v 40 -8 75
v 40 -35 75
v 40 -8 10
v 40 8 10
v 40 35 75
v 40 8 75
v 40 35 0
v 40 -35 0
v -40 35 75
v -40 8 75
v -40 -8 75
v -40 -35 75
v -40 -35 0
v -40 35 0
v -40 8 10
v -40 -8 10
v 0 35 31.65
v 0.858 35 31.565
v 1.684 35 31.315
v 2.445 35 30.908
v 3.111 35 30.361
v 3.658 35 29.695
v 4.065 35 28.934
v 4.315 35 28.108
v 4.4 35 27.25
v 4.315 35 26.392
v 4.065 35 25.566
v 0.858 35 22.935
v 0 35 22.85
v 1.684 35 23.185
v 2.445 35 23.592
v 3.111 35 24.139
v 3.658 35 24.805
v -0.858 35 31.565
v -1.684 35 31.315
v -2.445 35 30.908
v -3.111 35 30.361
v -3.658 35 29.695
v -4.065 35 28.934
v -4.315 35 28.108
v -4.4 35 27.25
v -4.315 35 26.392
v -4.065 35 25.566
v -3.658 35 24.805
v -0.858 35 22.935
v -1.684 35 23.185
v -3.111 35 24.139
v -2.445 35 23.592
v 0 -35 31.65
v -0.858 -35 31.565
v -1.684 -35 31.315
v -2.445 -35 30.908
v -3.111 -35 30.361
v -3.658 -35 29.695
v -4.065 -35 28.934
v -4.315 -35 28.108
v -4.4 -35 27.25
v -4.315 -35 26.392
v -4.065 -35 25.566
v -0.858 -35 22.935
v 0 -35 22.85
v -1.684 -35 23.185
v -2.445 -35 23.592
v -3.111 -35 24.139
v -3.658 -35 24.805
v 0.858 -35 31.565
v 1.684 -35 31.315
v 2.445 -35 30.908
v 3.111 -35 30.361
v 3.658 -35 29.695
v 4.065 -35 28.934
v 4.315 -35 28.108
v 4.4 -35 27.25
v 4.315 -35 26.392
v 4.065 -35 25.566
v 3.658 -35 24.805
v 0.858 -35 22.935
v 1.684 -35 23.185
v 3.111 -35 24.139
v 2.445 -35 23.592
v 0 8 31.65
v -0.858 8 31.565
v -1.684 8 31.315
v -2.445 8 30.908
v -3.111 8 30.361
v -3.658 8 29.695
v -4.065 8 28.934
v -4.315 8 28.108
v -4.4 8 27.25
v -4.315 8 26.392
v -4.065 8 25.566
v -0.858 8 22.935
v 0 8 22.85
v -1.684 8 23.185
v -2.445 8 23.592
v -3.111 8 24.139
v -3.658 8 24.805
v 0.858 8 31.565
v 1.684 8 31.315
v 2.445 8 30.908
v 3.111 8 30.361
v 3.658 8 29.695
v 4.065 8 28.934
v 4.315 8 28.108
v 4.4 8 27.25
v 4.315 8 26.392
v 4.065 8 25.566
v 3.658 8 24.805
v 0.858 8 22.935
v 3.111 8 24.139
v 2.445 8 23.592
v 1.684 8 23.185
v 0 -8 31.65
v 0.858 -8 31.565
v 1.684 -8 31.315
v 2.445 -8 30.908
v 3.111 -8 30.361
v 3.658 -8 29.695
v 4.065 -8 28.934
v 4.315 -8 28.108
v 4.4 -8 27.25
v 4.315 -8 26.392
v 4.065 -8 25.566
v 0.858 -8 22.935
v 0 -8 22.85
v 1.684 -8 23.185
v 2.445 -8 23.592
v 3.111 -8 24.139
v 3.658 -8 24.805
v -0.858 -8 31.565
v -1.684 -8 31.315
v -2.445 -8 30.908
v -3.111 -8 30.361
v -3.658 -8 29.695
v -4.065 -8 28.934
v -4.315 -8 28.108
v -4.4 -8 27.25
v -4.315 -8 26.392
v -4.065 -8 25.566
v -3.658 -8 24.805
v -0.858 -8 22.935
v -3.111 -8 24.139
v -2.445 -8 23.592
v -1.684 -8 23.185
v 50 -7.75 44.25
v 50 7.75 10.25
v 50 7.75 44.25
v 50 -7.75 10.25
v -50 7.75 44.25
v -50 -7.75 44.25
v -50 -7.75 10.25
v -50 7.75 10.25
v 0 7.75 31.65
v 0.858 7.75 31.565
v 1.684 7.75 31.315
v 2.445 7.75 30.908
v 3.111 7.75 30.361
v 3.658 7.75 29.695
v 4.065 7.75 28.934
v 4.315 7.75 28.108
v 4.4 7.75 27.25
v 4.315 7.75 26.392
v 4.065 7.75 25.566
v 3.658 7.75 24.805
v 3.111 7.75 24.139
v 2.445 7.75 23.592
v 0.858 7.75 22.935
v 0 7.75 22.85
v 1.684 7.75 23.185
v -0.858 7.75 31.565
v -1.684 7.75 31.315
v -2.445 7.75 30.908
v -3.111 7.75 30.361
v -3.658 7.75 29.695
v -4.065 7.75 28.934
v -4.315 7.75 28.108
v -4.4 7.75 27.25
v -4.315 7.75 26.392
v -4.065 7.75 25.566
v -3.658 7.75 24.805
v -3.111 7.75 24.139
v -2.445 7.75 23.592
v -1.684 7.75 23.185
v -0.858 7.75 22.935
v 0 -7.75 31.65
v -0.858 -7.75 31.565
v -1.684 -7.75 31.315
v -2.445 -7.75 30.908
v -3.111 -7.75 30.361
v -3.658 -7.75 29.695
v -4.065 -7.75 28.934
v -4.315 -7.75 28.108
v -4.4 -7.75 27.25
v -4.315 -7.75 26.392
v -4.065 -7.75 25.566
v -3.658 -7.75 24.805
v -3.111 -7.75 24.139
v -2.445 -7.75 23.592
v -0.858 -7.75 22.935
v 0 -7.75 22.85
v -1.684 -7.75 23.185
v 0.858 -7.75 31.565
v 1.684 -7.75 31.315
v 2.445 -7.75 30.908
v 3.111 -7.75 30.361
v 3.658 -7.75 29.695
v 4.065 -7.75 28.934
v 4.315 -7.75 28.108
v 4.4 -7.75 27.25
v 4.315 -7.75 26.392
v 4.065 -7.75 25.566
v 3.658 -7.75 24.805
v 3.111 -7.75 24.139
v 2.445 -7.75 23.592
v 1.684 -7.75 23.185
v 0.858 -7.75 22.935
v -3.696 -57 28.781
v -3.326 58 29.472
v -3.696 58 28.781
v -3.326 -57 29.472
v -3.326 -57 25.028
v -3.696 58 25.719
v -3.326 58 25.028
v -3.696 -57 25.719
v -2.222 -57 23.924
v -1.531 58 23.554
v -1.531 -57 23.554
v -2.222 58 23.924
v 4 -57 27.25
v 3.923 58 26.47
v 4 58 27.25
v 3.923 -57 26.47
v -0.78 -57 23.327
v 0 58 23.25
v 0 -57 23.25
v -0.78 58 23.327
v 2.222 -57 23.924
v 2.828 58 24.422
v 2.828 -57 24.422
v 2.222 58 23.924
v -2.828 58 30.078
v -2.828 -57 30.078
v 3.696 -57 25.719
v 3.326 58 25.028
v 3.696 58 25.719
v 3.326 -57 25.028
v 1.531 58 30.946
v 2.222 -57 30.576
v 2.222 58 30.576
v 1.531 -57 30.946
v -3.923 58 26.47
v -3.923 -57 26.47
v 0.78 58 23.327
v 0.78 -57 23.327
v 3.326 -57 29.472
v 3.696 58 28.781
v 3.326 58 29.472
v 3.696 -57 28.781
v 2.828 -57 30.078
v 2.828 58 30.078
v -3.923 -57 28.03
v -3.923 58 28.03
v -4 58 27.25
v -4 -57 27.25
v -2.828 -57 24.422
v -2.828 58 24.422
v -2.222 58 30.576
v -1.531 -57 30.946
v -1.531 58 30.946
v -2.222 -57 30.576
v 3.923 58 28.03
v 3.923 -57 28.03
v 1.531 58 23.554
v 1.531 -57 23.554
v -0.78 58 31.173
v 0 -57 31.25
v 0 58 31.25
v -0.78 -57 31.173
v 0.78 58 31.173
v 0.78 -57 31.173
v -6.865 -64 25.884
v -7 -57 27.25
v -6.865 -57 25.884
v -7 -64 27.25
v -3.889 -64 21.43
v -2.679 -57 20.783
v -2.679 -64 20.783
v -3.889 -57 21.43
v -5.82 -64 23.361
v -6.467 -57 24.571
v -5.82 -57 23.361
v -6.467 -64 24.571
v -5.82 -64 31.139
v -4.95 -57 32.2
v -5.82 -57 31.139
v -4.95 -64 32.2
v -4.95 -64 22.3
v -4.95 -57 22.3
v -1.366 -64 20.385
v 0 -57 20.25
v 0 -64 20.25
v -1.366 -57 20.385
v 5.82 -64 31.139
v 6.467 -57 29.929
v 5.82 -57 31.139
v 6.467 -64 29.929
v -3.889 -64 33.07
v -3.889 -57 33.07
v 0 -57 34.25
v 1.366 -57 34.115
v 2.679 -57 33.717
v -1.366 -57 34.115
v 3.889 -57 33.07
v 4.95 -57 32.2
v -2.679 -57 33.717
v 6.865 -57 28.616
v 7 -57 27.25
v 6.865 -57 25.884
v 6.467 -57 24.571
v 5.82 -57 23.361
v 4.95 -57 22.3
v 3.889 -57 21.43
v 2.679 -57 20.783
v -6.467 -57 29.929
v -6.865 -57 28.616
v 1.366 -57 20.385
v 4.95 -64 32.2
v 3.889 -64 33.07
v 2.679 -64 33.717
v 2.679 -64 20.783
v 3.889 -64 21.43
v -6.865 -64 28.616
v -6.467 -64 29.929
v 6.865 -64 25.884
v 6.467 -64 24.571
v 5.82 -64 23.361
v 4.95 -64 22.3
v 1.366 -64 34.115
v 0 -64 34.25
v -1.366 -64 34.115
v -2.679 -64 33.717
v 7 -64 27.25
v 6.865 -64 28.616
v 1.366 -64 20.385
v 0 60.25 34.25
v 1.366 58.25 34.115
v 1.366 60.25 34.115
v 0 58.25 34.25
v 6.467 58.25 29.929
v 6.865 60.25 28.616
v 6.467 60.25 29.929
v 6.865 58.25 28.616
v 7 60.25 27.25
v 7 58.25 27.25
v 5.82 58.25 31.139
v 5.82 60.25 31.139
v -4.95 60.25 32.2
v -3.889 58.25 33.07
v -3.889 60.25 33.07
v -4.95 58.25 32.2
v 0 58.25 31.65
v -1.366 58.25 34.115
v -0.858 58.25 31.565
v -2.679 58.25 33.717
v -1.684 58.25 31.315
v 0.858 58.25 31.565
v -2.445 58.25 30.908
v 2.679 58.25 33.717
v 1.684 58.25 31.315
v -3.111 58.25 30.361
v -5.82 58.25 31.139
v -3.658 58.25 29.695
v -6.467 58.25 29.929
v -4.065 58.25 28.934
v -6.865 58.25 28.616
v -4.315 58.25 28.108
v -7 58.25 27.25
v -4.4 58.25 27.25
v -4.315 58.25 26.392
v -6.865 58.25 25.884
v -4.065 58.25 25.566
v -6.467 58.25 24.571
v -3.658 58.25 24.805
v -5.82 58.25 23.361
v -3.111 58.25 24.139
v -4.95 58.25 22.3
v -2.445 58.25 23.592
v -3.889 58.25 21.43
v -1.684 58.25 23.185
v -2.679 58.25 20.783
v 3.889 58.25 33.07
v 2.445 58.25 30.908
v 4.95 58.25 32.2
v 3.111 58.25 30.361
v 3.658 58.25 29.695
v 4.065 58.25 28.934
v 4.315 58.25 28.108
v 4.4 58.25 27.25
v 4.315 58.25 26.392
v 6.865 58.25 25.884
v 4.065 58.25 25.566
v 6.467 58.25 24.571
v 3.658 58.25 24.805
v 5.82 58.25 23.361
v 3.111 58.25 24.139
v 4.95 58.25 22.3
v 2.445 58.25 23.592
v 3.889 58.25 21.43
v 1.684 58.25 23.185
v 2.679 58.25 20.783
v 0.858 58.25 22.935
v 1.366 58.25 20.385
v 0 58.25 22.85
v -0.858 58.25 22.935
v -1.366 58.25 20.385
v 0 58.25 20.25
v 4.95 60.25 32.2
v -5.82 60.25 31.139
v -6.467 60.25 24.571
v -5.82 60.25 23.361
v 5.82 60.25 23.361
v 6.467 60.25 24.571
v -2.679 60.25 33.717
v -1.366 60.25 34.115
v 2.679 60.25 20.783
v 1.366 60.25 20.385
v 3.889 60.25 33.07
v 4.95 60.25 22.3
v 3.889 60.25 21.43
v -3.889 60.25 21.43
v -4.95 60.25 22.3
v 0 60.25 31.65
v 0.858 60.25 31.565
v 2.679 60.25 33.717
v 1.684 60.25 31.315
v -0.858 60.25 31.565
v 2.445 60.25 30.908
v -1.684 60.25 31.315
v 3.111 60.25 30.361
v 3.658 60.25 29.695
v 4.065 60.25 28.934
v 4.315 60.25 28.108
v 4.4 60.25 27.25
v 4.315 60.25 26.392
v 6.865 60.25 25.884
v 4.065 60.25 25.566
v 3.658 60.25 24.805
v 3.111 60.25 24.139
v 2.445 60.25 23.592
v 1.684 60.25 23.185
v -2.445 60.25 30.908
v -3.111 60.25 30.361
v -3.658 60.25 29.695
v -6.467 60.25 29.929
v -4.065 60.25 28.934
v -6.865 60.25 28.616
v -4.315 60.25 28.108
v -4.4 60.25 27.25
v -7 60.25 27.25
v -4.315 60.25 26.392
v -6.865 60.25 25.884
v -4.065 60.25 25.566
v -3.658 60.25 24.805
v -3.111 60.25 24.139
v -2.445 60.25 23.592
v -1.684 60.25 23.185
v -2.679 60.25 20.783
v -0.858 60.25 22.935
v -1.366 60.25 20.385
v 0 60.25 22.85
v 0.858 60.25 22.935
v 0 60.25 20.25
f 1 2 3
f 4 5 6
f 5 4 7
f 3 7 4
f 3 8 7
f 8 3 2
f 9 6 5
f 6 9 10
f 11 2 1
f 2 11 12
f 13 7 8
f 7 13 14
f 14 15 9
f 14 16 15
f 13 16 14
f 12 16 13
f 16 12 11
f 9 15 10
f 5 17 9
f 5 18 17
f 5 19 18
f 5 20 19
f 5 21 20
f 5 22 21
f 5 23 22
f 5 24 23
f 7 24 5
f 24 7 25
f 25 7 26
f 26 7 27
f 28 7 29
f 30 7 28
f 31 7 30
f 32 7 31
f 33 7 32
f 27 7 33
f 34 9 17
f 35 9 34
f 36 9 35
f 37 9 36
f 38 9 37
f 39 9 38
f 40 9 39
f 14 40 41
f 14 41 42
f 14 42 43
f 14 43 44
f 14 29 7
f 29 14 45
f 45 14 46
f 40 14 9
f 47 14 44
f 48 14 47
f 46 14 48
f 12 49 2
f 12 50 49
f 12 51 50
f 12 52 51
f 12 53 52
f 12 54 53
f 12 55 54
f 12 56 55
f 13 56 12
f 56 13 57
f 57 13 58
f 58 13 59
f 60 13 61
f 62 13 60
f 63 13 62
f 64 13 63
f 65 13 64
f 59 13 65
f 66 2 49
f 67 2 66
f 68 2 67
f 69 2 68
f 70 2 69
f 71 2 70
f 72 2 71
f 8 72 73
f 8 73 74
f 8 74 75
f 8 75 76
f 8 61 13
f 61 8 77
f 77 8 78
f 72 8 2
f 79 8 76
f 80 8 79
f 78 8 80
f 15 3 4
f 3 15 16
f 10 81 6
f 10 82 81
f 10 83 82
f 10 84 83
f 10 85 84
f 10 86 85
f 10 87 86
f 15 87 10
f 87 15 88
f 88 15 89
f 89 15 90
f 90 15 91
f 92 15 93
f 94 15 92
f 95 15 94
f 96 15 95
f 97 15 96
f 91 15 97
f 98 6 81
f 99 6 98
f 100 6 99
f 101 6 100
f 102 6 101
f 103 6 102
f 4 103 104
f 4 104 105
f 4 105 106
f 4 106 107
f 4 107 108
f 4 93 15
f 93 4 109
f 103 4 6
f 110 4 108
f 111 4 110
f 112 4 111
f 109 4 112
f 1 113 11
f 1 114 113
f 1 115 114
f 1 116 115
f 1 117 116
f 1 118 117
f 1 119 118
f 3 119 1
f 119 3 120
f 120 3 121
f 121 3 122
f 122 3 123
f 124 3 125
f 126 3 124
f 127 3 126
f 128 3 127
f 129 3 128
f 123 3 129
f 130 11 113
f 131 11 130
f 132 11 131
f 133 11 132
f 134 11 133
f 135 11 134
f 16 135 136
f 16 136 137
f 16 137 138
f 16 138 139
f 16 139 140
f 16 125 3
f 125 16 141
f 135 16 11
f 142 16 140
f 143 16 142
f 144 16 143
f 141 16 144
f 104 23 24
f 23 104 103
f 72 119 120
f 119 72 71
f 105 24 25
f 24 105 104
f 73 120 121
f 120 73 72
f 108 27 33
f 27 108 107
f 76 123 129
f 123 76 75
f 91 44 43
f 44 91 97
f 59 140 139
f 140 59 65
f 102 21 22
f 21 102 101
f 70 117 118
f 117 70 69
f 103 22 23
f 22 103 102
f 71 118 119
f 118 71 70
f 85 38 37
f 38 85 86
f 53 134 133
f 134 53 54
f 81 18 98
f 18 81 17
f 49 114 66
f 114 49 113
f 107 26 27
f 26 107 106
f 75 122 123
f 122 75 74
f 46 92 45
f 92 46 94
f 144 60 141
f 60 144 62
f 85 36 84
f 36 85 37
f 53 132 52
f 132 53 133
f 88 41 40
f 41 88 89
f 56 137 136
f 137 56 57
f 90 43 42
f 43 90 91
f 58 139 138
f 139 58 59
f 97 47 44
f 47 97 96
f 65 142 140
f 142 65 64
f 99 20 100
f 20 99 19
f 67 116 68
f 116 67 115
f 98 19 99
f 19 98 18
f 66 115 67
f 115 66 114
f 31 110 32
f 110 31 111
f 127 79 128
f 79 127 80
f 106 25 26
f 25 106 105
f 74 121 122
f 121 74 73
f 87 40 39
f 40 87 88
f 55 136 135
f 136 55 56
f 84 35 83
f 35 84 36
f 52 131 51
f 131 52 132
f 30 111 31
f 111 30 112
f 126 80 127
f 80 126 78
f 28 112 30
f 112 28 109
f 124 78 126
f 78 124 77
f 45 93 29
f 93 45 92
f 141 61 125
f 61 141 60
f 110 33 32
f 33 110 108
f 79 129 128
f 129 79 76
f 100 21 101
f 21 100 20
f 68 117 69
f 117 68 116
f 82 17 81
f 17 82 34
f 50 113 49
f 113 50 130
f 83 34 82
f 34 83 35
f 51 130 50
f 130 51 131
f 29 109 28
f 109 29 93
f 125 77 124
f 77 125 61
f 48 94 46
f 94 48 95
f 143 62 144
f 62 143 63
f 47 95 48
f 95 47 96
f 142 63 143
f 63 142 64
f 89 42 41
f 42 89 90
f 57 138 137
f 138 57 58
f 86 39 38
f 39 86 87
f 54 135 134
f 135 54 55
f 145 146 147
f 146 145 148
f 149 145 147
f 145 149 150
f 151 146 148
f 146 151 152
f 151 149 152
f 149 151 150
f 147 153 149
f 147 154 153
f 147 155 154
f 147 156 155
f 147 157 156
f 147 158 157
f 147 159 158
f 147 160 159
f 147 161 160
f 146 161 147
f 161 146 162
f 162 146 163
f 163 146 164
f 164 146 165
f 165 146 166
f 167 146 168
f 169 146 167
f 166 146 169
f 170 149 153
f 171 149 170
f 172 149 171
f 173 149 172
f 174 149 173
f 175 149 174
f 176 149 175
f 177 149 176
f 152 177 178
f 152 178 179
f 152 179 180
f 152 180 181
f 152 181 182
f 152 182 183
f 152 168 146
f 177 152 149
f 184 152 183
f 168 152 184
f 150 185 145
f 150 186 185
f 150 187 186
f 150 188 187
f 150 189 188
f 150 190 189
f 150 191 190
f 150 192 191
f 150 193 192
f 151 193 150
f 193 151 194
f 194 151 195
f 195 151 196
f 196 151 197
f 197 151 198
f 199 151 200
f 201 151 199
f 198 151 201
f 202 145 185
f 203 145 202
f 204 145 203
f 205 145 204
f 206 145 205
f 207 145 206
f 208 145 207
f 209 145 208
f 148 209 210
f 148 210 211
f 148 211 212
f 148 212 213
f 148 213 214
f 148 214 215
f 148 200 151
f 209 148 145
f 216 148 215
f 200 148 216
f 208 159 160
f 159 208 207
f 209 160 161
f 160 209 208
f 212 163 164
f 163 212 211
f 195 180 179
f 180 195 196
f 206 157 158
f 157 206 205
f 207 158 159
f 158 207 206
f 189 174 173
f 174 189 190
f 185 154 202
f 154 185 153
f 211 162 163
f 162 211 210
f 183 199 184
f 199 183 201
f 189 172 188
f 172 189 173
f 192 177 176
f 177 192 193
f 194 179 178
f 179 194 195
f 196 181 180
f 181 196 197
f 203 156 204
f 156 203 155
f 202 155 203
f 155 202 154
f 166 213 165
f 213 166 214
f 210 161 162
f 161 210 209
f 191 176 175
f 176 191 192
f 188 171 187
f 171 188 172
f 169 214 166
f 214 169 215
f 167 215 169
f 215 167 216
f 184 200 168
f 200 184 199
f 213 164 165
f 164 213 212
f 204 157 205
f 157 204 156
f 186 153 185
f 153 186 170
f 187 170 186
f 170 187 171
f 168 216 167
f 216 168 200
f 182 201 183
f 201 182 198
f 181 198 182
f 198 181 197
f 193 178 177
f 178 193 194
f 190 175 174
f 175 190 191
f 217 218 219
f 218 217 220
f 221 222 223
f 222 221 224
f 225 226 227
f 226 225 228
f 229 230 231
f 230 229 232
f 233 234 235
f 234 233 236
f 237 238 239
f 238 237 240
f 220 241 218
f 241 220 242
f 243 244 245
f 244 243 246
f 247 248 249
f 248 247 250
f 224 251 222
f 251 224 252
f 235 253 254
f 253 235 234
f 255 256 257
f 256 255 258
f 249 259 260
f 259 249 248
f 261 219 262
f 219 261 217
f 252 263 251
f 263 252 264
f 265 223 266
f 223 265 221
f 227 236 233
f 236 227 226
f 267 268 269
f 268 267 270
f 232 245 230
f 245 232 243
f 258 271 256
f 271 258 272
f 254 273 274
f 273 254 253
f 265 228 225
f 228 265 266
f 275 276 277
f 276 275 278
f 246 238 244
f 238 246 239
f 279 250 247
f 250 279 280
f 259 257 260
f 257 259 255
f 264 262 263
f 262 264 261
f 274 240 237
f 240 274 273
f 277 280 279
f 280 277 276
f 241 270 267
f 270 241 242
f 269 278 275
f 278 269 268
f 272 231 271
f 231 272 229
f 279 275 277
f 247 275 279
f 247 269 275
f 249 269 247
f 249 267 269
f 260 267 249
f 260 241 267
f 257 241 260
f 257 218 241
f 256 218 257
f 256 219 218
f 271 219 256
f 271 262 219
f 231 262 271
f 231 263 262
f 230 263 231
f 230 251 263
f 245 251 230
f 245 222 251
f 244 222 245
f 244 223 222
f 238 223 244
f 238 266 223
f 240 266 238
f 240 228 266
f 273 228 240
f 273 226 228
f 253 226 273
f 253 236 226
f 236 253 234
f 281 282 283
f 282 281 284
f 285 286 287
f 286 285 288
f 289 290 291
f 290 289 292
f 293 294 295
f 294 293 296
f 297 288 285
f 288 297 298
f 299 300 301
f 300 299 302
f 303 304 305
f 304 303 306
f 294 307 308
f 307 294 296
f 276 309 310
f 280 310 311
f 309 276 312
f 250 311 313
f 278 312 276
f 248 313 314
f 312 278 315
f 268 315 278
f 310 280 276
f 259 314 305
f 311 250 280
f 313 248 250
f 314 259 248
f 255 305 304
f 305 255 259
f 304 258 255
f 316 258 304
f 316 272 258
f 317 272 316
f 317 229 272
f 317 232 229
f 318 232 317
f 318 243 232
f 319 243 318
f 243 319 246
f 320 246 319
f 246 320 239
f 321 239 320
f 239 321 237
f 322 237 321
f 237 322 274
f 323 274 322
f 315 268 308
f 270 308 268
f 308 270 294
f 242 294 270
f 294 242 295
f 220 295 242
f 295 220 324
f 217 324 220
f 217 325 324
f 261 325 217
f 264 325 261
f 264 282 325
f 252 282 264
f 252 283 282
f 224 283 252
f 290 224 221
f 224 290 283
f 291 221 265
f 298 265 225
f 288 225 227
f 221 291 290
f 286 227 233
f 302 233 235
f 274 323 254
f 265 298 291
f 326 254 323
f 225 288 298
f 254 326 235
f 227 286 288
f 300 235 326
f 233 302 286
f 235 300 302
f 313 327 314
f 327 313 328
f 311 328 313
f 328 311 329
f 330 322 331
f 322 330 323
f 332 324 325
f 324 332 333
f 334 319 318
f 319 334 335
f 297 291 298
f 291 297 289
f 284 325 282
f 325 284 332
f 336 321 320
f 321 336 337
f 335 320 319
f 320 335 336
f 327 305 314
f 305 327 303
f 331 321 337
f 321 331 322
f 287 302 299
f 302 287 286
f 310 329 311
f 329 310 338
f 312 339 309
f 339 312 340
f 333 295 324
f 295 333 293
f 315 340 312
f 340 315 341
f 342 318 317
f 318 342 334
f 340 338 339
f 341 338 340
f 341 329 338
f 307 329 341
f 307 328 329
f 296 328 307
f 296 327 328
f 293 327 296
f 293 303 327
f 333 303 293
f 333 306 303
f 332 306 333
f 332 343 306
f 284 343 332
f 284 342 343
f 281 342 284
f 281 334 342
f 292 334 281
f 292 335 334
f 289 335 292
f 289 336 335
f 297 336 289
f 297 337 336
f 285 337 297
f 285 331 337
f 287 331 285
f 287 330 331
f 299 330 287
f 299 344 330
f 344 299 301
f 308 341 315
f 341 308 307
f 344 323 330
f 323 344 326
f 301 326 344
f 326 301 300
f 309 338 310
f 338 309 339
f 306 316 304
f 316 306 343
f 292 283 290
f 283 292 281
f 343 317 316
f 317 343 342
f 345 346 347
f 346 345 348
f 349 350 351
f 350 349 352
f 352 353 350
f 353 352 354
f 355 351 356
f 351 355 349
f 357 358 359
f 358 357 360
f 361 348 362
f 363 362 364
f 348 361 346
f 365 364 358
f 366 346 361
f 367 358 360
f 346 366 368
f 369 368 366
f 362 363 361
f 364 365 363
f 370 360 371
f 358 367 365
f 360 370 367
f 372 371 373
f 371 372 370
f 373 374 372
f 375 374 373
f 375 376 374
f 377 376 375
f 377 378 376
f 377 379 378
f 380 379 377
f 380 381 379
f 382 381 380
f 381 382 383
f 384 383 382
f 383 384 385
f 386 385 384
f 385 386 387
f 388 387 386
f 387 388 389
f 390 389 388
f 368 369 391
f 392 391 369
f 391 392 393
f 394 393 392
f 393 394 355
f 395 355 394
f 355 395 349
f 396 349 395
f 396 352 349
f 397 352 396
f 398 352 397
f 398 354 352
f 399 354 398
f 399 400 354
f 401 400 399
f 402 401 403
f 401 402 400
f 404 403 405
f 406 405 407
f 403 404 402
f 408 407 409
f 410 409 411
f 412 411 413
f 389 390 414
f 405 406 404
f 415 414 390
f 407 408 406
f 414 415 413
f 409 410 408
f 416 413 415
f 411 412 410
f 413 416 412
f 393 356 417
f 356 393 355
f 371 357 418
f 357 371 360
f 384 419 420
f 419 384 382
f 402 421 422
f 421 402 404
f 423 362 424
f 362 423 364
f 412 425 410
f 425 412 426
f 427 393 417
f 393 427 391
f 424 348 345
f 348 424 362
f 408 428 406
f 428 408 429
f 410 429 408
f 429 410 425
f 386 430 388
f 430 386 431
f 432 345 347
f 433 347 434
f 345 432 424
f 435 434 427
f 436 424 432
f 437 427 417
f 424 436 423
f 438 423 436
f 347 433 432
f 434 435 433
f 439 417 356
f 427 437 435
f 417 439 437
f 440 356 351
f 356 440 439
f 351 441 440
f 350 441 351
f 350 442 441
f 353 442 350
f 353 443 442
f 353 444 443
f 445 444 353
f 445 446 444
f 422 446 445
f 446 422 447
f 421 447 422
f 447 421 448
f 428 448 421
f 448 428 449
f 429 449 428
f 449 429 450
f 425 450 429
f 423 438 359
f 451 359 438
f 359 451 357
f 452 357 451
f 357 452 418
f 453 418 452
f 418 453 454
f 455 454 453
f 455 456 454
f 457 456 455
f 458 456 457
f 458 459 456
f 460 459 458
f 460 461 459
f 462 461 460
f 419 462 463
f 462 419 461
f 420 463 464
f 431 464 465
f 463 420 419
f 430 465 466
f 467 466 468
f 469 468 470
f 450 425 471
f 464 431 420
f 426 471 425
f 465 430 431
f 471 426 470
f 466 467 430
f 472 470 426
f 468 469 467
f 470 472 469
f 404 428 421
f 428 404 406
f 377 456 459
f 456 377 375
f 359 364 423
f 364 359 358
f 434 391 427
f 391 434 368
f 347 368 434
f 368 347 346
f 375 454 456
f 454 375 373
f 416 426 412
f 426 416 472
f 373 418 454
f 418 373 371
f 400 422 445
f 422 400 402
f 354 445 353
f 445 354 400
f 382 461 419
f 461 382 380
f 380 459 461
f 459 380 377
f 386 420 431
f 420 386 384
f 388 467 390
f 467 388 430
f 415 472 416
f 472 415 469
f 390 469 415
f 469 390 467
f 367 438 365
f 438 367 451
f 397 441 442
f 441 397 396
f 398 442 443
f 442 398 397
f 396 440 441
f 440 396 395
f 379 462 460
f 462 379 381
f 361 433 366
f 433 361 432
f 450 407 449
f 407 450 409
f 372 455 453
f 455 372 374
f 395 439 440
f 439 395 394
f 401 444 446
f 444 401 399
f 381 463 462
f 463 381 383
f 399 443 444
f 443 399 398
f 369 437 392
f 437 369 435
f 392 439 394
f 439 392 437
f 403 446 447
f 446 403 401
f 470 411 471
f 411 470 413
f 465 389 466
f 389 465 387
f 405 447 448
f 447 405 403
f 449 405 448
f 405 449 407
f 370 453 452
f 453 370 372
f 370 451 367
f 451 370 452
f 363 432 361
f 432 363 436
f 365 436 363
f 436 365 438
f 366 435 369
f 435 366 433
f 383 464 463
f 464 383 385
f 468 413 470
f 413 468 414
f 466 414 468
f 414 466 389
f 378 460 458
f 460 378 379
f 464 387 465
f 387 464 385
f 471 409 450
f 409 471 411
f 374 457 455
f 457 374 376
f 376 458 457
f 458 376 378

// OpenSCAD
$fn = 32;

// ------------------------------------------------------------------------
// Clevis joint: 80 mm clevis, pin d8
// Every part is its own module, assembly() places them once.
// ------------------------------------------------------------------------

// --- part 1 ---
module clevis() {
  difference() {
    translate([-40, -35, 0]) cube([80, 70, 75]);
    translate([-41, -8, 10]) cube([82, 16, 66]);
    translate([0, 0, 27.25]) rotate([90, 0, 0]) cylinder(h = 72, d = 8.8, center = true);
  }
}

// --- part 2 ---
module eye() {
  difference() {
    translate([-50, -7.75, 0]) cube([100, 15.5, 34]);
    translate([0, 0, 17]) rotate([90, 0, 0]) cylinder(h = 17.5, d = 8.8, center = true);
  }
}

// --- part 3 ---
module pin() {
  rotate([0, 90, 0]) cylinder(h = 116, d = 8, center = true);
  translate([-64, 0, 0]) rotate([0, 90, 0]) cylinder(h = 7, d = 14);
}

// --- part 4 ---
module retainer() {
  difference() {
      translate([0, 0, 0]) cylinder(h = 2, d = 14);
      translate([0, 0, -1]) cylinder(h = 4, d = 8.8);
    }
}

// --- assembly ---
module assembly() {
  translate([0, 0, 0]) rotate([0, 0, 0]) clevis();
  translate([0, 0, 10.25]) rotate([0, 0, 0]) eye();
  translate([0, 0, 27.25]) rotate([0, 0, 90]) pin();
  translate([0, 60.25, 27.25]) rotate([90, 0, 0]) retainer();
}

assembly();
